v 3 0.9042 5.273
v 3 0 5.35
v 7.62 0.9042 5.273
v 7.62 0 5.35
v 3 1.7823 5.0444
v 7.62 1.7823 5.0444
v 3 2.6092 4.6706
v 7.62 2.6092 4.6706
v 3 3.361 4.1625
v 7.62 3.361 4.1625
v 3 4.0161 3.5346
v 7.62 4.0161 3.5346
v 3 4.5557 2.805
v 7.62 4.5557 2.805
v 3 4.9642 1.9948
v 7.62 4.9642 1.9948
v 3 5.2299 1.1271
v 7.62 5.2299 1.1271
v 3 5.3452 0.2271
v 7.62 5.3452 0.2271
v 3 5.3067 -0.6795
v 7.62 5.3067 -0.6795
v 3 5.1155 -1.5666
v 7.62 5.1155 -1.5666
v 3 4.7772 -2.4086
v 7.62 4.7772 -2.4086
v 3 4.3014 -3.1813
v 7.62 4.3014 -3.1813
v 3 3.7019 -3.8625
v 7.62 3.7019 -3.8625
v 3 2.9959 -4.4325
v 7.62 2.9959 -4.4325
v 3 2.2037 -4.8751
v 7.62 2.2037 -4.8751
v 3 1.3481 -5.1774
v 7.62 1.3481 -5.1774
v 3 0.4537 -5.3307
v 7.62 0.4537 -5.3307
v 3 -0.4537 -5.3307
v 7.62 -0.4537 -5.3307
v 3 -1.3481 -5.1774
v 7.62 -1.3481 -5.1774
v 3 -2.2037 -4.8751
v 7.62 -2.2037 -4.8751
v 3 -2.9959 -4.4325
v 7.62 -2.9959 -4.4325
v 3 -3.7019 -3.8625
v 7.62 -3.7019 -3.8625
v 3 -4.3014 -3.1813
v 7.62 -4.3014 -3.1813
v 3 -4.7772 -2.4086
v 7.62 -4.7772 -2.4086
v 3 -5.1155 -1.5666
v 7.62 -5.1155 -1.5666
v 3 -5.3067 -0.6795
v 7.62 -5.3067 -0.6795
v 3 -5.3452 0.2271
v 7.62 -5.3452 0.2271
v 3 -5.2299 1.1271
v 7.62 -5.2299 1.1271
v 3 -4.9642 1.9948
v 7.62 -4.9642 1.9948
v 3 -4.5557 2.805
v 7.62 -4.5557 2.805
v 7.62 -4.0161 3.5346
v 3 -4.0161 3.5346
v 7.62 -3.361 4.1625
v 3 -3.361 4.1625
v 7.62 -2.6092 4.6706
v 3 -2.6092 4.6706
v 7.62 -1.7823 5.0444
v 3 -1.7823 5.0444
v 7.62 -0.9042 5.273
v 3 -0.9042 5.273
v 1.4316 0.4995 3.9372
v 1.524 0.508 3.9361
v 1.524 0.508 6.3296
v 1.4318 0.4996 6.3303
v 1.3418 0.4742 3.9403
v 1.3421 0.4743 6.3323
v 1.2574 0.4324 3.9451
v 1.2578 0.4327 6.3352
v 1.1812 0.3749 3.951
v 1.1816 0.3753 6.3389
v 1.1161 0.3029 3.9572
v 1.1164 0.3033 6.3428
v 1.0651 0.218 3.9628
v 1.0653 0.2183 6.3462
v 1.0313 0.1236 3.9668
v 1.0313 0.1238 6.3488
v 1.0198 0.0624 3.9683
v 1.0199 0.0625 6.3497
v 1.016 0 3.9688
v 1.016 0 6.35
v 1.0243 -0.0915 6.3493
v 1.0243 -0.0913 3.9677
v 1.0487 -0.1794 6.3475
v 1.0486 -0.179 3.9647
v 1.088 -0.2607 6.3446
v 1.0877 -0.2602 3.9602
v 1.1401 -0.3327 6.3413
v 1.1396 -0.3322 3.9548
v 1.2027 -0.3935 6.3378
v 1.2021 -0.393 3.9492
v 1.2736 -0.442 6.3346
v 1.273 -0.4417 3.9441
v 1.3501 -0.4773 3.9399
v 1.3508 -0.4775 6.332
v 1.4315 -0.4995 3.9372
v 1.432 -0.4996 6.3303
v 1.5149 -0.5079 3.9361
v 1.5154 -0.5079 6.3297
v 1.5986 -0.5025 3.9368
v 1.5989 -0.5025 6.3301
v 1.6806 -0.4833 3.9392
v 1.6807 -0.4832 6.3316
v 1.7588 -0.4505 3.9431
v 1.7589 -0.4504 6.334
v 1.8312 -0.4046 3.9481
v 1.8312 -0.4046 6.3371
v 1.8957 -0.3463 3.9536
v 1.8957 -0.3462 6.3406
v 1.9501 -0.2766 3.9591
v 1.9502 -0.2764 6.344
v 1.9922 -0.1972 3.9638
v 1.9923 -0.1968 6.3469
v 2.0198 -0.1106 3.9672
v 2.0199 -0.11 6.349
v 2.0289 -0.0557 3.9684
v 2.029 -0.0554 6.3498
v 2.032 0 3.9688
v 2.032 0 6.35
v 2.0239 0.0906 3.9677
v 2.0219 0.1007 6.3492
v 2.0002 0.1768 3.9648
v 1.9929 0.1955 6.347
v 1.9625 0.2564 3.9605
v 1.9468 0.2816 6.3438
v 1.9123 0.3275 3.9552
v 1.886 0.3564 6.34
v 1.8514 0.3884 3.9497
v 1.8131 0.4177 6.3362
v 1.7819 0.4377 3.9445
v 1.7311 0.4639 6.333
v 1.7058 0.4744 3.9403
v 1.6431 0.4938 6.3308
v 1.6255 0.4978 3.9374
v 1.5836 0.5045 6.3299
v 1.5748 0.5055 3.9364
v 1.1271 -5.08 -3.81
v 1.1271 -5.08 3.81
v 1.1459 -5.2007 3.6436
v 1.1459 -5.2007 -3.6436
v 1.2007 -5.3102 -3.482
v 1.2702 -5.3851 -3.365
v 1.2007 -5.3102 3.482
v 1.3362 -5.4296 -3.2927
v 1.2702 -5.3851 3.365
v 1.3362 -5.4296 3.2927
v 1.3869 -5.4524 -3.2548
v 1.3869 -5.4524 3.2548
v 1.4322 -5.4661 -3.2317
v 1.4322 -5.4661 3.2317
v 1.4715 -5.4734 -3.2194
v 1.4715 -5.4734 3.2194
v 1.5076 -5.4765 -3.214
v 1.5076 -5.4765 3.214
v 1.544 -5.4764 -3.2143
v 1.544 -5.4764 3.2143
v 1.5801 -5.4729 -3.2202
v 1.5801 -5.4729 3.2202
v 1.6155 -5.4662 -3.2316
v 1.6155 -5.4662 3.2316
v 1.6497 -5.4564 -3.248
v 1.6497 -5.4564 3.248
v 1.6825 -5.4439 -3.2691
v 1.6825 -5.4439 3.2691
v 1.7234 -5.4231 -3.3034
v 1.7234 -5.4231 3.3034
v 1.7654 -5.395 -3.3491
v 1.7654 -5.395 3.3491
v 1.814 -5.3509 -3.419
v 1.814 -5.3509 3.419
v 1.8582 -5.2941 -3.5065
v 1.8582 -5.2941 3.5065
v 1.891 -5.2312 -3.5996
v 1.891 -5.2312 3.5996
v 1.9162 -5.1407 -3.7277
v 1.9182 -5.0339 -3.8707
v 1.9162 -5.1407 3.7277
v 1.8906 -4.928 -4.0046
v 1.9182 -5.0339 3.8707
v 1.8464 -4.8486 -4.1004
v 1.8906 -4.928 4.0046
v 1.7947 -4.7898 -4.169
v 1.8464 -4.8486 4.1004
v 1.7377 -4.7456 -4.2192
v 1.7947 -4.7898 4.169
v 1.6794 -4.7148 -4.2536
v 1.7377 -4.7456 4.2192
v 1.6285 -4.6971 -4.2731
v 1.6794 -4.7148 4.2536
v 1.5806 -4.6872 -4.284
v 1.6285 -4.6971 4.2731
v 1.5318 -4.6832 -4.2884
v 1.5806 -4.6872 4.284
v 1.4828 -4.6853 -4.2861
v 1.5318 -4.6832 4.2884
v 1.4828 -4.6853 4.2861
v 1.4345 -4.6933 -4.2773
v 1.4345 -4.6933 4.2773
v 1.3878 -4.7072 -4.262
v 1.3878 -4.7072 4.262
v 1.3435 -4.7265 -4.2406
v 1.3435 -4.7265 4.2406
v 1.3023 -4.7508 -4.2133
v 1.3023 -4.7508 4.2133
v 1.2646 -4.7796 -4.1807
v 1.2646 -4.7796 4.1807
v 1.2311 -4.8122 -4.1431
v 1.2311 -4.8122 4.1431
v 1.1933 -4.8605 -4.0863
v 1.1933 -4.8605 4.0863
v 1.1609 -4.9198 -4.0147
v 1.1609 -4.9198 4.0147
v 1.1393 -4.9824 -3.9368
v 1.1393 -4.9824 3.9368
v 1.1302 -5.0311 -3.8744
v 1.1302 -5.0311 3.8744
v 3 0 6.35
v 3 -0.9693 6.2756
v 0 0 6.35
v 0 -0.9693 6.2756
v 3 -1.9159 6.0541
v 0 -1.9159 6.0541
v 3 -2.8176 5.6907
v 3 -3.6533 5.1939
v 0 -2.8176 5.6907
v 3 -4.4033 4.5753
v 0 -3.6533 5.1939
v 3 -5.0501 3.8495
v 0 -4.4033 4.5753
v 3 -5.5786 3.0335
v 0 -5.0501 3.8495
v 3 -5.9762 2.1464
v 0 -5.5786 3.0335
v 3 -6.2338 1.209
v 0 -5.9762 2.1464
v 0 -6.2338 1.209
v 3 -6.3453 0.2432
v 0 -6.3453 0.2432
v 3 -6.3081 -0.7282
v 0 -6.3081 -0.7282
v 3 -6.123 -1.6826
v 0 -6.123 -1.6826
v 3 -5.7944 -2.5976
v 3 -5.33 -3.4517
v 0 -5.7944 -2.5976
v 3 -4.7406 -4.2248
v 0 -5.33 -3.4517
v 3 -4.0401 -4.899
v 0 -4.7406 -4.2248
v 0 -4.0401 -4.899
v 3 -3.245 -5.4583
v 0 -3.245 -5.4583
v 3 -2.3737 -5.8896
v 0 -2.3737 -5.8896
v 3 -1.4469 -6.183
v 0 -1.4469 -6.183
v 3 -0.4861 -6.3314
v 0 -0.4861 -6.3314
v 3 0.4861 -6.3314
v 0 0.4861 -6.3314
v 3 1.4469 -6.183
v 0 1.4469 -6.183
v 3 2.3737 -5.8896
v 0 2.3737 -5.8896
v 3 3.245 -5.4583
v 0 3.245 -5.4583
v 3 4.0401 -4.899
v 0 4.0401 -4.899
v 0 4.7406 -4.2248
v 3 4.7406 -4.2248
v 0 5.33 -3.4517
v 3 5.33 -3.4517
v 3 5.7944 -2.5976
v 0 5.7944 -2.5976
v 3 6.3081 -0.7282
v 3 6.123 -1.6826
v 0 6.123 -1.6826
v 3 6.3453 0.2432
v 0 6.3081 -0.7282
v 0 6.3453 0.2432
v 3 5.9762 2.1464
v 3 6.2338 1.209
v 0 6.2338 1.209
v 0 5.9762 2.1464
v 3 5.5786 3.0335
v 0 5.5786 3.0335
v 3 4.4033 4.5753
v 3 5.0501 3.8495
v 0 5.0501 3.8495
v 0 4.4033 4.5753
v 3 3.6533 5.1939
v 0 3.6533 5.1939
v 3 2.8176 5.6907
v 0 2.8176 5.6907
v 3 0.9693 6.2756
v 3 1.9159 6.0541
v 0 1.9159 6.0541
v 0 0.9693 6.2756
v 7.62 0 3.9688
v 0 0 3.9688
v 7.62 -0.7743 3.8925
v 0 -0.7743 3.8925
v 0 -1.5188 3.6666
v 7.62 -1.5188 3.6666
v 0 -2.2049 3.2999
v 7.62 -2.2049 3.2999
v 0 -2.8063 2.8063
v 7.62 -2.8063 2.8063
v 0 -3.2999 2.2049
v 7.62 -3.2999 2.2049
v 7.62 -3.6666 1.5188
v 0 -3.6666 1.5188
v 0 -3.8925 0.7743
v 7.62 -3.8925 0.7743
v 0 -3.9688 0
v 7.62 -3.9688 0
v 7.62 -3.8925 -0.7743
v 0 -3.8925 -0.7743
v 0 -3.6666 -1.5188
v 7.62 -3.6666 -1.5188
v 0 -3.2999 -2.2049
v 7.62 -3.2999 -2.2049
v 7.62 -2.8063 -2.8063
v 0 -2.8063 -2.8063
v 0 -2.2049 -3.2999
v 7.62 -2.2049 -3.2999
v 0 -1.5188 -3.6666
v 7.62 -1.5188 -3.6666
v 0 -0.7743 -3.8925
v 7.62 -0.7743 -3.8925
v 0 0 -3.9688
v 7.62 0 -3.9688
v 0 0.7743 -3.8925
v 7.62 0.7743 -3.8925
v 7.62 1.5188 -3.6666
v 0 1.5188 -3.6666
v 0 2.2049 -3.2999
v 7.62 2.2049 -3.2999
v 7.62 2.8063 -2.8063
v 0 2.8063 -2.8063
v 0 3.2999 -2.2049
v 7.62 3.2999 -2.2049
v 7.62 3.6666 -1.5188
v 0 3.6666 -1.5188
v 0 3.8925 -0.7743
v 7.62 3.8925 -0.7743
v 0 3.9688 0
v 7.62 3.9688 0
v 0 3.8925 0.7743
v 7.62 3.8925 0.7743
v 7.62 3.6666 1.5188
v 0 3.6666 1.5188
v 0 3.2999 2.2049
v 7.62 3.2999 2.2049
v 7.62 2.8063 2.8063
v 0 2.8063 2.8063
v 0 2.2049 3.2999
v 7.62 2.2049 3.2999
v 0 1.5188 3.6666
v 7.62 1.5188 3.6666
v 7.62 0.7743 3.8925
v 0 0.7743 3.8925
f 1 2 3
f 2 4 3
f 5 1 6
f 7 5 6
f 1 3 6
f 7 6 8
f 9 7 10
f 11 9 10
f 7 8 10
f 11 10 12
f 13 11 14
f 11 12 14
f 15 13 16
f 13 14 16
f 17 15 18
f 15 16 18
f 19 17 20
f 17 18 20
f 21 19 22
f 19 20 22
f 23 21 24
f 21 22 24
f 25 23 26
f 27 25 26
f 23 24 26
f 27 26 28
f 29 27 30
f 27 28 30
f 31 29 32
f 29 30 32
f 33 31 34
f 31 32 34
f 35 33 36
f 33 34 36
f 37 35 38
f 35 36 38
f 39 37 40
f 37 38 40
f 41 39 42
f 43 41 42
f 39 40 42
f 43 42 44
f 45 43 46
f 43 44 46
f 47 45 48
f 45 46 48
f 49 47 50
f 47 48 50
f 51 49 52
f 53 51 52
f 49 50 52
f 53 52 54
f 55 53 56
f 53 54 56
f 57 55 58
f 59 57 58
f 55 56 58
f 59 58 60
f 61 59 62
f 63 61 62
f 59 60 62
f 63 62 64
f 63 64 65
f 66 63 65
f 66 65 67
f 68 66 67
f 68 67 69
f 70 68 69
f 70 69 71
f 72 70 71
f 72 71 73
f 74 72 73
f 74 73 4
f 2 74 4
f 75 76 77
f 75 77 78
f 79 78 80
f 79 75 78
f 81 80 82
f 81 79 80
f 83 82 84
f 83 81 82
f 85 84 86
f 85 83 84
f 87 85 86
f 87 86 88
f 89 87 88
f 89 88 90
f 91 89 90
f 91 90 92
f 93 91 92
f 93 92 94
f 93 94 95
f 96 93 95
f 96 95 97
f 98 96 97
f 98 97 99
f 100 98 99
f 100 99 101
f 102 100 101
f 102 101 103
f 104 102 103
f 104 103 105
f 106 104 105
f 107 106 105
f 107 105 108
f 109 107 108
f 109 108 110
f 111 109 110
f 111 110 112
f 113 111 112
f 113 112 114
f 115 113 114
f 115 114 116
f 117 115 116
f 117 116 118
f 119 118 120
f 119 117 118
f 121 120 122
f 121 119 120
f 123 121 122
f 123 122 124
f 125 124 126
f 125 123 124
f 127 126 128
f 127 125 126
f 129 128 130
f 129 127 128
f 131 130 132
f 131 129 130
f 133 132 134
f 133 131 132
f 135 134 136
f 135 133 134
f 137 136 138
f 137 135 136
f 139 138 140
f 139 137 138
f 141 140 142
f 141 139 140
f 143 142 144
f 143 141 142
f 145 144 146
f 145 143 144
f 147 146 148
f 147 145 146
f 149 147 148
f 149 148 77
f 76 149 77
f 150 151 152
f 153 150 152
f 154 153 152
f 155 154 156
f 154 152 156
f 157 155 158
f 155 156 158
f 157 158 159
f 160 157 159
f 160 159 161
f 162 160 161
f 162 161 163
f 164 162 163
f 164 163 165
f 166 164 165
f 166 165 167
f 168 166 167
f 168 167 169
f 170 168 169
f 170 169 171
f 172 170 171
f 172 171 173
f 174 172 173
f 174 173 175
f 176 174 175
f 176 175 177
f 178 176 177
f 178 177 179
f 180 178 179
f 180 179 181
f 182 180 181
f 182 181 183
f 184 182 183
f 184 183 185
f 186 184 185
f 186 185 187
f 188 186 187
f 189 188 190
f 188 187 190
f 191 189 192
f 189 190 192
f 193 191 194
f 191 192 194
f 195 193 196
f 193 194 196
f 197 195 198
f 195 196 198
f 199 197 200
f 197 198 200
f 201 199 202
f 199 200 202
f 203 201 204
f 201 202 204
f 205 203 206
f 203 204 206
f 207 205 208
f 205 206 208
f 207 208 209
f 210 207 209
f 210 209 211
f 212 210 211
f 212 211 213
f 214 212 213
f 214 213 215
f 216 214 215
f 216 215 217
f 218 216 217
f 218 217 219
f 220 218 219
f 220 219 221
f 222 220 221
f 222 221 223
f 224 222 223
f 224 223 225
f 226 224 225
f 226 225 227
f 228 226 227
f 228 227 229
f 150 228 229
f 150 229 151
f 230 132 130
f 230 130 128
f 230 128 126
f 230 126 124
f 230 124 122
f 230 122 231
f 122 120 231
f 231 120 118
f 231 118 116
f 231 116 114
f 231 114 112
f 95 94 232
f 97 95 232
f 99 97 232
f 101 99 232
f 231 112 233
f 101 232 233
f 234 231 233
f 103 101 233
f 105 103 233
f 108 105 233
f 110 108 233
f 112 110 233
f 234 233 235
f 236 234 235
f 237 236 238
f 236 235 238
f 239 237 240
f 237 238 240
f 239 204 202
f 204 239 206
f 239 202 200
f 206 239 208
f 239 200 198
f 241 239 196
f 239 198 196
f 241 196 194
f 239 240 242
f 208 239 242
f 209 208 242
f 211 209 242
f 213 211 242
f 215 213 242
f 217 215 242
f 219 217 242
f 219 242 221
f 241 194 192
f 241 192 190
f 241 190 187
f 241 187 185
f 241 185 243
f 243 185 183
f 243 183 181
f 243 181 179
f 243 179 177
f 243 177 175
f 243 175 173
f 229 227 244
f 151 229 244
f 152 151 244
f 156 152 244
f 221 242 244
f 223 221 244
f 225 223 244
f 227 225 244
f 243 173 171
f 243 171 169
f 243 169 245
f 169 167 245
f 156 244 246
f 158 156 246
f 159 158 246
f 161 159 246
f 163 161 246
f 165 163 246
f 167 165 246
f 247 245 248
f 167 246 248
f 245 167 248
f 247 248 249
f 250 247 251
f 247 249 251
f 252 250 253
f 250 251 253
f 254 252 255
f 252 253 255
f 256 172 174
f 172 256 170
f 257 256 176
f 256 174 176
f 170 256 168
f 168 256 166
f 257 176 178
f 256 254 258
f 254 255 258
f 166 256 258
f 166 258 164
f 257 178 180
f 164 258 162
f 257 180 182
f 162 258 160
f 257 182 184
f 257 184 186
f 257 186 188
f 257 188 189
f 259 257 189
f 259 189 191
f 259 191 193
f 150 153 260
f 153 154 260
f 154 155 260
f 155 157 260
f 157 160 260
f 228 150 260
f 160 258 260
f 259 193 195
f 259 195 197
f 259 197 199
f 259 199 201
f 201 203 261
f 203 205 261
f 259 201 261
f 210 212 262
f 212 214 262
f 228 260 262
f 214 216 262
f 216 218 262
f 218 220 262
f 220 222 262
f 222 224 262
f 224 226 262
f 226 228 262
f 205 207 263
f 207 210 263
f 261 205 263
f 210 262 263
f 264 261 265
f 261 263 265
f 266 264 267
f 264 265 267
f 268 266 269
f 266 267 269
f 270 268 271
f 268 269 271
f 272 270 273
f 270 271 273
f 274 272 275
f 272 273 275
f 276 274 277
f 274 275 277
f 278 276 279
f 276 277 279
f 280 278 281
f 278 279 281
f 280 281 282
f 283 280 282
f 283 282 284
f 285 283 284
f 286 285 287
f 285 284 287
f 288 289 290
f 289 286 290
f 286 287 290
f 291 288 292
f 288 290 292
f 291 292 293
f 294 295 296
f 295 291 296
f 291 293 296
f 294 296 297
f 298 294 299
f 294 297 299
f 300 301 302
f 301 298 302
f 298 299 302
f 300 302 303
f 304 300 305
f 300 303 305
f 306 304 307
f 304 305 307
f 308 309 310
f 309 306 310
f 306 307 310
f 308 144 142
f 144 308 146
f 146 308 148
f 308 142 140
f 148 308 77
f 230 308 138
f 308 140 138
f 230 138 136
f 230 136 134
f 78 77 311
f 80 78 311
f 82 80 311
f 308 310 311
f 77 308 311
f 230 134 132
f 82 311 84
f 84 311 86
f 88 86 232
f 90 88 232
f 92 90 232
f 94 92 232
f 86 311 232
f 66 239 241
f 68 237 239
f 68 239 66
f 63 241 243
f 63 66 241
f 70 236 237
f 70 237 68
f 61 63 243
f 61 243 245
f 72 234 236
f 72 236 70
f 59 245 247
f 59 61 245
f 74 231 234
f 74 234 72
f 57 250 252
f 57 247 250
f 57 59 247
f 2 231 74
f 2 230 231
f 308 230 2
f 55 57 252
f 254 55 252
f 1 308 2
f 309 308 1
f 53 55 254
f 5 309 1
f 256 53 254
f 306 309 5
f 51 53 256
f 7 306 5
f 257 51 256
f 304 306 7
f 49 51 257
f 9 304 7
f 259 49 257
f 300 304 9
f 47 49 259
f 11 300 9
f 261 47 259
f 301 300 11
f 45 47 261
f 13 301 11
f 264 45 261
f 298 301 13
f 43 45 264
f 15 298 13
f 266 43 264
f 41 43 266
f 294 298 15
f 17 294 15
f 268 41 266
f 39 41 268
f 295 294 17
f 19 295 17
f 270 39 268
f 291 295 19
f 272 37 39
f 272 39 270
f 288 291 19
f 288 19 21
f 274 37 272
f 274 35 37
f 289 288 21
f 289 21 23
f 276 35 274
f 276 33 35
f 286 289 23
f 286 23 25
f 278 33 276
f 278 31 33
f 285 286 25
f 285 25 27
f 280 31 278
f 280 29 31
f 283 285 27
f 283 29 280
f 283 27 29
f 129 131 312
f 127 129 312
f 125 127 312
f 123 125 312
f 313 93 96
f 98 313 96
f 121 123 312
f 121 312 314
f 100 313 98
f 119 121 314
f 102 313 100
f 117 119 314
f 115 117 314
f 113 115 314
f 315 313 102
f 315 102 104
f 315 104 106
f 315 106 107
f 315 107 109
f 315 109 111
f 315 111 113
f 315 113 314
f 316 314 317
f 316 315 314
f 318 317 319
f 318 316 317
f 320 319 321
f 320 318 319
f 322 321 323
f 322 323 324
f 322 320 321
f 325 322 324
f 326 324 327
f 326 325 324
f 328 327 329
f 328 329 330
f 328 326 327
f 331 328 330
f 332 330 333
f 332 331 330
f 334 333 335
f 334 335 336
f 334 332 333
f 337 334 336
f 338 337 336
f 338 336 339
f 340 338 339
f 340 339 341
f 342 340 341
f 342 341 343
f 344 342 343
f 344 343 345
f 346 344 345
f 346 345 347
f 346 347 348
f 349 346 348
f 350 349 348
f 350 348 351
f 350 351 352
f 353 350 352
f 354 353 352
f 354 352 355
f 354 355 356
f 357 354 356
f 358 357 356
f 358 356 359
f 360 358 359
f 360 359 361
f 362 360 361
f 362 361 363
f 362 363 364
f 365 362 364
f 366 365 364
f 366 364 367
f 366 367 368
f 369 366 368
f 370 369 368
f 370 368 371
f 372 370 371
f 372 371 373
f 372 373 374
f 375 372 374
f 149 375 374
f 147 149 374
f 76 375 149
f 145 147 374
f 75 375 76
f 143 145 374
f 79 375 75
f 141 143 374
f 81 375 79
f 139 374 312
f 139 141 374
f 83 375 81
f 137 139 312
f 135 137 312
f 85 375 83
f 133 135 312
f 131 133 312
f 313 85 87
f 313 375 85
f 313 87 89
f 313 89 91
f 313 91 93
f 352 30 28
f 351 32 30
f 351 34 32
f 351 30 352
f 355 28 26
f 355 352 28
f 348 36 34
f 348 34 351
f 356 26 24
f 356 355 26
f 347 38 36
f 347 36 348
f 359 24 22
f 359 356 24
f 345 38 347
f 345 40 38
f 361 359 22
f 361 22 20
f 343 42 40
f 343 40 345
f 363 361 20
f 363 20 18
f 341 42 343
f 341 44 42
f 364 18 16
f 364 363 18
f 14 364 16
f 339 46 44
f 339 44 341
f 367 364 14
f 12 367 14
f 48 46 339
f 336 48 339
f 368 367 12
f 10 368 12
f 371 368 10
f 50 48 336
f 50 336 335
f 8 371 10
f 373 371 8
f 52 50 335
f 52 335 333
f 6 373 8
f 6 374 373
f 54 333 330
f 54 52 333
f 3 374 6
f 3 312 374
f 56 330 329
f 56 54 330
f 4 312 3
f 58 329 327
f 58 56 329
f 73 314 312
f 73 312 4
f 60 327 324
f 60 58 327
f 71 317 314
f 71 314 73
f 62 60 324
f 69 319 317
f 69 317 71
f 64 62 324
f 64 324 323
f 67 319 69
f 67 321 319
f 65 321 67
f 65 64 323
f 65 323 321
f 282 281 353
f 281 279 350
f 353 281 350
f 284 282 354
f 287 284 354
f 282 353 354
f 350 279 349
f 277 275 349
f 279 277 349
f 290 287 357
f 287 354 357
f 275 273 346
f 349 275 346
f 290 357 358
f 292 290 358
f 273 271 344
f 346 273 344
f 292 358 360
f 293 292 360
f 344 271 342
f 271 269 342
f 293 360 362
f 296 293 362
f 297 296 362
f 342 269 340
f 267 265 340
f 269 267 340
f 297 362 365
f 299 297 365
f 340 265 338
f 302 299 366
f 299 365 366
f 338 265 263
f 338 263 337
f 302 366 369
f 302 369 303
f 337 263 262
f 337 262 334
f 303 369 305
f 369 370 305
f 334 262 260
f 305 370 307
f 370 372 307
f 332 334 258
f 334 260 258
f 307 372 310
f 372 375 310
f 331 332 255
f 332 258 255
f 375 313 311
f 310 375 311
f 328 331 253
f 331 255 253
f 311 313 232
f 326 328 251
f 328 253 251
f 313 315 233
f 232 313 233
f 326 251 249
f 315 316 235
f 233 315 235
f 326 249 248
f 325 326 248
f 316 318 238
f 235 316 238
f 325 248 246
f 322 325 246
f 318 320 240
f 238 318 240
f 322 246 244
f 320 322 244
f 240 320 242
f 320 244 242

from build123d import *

# Parameters (mm, degrees)
SKETCH1_R                       = 6.35
SKETCH1_R_2                     = 3.96875
BOSS_EXTRUDE1_DEPTH             = 7.62
SKETCH2_W                       = 4.62
SKETCH2_H                       = 1
F_1_32_0_03125_DIAMETER_HOLE1_D = 0.79375


with BuildPart() as part:
    # Sketch1 → Boss-Extrude1 (new body)
    with BuildSketch(Plane(origin=(0, 0, 0), x_dir=(0, 0, -1), z_dir=(1, 0, 0))):
        with Locations(Location((0, 0, 0), (0, 0, 180))):
            Circle(SKETCH1_R)
        with Locations(Location((0, 0, 0), (0, 0, 180))):
            Circle(SKETCH1_R_2, mode=Mode.SUBTRACT)
    extrude(amount=BOSS_EXTRUDE1_DEPTH)

    # Sketch2 → Cut-Revolve1 (revolve, cut)
    with BuildSketch(Plane.XY, mode=Mode.PRIVATE) as cut_revolve1_sk:
        with Locations((5.31, 5.85)):
            Rectangle(SKETCH2_W, SKETCH2_H)
    revolve(cut_revolve1_sk.sketch.rotate(Axis((7.62, 0, 0), (-1, 0, 0)), 270), axis=Axis((7.62, 0, 0), (-1, 0, 0)), mode=Mode.SUBTRACT)

    # Sketch3 → #60 (0.04) Diameter Hole1 (revolve, cut)
    with BuildSketch(Plane.YZ.offset(1.524)):
        Polygon((0, 0), (0, 25.705237194), (0.508, 25.4), (0.508, 0), align=None)
    revolve(axis=Axis((1.524, 0, -6.35), (0, 0, 1)), mode=Mode.SUBTRACT)

    # 1/32 (0.03125) Diameter Hole1 (through all)
    with Locations(Plane(origin=(0, 0, -5.08), x_dir=(1, 0, 0), z_dir=(0, 0, -1))):
        with Locations((1.524, 5.08)):
            Hole(F_1_32_0_03125_DIAMETER_HOLE1_D / 2)


solid = part.part
